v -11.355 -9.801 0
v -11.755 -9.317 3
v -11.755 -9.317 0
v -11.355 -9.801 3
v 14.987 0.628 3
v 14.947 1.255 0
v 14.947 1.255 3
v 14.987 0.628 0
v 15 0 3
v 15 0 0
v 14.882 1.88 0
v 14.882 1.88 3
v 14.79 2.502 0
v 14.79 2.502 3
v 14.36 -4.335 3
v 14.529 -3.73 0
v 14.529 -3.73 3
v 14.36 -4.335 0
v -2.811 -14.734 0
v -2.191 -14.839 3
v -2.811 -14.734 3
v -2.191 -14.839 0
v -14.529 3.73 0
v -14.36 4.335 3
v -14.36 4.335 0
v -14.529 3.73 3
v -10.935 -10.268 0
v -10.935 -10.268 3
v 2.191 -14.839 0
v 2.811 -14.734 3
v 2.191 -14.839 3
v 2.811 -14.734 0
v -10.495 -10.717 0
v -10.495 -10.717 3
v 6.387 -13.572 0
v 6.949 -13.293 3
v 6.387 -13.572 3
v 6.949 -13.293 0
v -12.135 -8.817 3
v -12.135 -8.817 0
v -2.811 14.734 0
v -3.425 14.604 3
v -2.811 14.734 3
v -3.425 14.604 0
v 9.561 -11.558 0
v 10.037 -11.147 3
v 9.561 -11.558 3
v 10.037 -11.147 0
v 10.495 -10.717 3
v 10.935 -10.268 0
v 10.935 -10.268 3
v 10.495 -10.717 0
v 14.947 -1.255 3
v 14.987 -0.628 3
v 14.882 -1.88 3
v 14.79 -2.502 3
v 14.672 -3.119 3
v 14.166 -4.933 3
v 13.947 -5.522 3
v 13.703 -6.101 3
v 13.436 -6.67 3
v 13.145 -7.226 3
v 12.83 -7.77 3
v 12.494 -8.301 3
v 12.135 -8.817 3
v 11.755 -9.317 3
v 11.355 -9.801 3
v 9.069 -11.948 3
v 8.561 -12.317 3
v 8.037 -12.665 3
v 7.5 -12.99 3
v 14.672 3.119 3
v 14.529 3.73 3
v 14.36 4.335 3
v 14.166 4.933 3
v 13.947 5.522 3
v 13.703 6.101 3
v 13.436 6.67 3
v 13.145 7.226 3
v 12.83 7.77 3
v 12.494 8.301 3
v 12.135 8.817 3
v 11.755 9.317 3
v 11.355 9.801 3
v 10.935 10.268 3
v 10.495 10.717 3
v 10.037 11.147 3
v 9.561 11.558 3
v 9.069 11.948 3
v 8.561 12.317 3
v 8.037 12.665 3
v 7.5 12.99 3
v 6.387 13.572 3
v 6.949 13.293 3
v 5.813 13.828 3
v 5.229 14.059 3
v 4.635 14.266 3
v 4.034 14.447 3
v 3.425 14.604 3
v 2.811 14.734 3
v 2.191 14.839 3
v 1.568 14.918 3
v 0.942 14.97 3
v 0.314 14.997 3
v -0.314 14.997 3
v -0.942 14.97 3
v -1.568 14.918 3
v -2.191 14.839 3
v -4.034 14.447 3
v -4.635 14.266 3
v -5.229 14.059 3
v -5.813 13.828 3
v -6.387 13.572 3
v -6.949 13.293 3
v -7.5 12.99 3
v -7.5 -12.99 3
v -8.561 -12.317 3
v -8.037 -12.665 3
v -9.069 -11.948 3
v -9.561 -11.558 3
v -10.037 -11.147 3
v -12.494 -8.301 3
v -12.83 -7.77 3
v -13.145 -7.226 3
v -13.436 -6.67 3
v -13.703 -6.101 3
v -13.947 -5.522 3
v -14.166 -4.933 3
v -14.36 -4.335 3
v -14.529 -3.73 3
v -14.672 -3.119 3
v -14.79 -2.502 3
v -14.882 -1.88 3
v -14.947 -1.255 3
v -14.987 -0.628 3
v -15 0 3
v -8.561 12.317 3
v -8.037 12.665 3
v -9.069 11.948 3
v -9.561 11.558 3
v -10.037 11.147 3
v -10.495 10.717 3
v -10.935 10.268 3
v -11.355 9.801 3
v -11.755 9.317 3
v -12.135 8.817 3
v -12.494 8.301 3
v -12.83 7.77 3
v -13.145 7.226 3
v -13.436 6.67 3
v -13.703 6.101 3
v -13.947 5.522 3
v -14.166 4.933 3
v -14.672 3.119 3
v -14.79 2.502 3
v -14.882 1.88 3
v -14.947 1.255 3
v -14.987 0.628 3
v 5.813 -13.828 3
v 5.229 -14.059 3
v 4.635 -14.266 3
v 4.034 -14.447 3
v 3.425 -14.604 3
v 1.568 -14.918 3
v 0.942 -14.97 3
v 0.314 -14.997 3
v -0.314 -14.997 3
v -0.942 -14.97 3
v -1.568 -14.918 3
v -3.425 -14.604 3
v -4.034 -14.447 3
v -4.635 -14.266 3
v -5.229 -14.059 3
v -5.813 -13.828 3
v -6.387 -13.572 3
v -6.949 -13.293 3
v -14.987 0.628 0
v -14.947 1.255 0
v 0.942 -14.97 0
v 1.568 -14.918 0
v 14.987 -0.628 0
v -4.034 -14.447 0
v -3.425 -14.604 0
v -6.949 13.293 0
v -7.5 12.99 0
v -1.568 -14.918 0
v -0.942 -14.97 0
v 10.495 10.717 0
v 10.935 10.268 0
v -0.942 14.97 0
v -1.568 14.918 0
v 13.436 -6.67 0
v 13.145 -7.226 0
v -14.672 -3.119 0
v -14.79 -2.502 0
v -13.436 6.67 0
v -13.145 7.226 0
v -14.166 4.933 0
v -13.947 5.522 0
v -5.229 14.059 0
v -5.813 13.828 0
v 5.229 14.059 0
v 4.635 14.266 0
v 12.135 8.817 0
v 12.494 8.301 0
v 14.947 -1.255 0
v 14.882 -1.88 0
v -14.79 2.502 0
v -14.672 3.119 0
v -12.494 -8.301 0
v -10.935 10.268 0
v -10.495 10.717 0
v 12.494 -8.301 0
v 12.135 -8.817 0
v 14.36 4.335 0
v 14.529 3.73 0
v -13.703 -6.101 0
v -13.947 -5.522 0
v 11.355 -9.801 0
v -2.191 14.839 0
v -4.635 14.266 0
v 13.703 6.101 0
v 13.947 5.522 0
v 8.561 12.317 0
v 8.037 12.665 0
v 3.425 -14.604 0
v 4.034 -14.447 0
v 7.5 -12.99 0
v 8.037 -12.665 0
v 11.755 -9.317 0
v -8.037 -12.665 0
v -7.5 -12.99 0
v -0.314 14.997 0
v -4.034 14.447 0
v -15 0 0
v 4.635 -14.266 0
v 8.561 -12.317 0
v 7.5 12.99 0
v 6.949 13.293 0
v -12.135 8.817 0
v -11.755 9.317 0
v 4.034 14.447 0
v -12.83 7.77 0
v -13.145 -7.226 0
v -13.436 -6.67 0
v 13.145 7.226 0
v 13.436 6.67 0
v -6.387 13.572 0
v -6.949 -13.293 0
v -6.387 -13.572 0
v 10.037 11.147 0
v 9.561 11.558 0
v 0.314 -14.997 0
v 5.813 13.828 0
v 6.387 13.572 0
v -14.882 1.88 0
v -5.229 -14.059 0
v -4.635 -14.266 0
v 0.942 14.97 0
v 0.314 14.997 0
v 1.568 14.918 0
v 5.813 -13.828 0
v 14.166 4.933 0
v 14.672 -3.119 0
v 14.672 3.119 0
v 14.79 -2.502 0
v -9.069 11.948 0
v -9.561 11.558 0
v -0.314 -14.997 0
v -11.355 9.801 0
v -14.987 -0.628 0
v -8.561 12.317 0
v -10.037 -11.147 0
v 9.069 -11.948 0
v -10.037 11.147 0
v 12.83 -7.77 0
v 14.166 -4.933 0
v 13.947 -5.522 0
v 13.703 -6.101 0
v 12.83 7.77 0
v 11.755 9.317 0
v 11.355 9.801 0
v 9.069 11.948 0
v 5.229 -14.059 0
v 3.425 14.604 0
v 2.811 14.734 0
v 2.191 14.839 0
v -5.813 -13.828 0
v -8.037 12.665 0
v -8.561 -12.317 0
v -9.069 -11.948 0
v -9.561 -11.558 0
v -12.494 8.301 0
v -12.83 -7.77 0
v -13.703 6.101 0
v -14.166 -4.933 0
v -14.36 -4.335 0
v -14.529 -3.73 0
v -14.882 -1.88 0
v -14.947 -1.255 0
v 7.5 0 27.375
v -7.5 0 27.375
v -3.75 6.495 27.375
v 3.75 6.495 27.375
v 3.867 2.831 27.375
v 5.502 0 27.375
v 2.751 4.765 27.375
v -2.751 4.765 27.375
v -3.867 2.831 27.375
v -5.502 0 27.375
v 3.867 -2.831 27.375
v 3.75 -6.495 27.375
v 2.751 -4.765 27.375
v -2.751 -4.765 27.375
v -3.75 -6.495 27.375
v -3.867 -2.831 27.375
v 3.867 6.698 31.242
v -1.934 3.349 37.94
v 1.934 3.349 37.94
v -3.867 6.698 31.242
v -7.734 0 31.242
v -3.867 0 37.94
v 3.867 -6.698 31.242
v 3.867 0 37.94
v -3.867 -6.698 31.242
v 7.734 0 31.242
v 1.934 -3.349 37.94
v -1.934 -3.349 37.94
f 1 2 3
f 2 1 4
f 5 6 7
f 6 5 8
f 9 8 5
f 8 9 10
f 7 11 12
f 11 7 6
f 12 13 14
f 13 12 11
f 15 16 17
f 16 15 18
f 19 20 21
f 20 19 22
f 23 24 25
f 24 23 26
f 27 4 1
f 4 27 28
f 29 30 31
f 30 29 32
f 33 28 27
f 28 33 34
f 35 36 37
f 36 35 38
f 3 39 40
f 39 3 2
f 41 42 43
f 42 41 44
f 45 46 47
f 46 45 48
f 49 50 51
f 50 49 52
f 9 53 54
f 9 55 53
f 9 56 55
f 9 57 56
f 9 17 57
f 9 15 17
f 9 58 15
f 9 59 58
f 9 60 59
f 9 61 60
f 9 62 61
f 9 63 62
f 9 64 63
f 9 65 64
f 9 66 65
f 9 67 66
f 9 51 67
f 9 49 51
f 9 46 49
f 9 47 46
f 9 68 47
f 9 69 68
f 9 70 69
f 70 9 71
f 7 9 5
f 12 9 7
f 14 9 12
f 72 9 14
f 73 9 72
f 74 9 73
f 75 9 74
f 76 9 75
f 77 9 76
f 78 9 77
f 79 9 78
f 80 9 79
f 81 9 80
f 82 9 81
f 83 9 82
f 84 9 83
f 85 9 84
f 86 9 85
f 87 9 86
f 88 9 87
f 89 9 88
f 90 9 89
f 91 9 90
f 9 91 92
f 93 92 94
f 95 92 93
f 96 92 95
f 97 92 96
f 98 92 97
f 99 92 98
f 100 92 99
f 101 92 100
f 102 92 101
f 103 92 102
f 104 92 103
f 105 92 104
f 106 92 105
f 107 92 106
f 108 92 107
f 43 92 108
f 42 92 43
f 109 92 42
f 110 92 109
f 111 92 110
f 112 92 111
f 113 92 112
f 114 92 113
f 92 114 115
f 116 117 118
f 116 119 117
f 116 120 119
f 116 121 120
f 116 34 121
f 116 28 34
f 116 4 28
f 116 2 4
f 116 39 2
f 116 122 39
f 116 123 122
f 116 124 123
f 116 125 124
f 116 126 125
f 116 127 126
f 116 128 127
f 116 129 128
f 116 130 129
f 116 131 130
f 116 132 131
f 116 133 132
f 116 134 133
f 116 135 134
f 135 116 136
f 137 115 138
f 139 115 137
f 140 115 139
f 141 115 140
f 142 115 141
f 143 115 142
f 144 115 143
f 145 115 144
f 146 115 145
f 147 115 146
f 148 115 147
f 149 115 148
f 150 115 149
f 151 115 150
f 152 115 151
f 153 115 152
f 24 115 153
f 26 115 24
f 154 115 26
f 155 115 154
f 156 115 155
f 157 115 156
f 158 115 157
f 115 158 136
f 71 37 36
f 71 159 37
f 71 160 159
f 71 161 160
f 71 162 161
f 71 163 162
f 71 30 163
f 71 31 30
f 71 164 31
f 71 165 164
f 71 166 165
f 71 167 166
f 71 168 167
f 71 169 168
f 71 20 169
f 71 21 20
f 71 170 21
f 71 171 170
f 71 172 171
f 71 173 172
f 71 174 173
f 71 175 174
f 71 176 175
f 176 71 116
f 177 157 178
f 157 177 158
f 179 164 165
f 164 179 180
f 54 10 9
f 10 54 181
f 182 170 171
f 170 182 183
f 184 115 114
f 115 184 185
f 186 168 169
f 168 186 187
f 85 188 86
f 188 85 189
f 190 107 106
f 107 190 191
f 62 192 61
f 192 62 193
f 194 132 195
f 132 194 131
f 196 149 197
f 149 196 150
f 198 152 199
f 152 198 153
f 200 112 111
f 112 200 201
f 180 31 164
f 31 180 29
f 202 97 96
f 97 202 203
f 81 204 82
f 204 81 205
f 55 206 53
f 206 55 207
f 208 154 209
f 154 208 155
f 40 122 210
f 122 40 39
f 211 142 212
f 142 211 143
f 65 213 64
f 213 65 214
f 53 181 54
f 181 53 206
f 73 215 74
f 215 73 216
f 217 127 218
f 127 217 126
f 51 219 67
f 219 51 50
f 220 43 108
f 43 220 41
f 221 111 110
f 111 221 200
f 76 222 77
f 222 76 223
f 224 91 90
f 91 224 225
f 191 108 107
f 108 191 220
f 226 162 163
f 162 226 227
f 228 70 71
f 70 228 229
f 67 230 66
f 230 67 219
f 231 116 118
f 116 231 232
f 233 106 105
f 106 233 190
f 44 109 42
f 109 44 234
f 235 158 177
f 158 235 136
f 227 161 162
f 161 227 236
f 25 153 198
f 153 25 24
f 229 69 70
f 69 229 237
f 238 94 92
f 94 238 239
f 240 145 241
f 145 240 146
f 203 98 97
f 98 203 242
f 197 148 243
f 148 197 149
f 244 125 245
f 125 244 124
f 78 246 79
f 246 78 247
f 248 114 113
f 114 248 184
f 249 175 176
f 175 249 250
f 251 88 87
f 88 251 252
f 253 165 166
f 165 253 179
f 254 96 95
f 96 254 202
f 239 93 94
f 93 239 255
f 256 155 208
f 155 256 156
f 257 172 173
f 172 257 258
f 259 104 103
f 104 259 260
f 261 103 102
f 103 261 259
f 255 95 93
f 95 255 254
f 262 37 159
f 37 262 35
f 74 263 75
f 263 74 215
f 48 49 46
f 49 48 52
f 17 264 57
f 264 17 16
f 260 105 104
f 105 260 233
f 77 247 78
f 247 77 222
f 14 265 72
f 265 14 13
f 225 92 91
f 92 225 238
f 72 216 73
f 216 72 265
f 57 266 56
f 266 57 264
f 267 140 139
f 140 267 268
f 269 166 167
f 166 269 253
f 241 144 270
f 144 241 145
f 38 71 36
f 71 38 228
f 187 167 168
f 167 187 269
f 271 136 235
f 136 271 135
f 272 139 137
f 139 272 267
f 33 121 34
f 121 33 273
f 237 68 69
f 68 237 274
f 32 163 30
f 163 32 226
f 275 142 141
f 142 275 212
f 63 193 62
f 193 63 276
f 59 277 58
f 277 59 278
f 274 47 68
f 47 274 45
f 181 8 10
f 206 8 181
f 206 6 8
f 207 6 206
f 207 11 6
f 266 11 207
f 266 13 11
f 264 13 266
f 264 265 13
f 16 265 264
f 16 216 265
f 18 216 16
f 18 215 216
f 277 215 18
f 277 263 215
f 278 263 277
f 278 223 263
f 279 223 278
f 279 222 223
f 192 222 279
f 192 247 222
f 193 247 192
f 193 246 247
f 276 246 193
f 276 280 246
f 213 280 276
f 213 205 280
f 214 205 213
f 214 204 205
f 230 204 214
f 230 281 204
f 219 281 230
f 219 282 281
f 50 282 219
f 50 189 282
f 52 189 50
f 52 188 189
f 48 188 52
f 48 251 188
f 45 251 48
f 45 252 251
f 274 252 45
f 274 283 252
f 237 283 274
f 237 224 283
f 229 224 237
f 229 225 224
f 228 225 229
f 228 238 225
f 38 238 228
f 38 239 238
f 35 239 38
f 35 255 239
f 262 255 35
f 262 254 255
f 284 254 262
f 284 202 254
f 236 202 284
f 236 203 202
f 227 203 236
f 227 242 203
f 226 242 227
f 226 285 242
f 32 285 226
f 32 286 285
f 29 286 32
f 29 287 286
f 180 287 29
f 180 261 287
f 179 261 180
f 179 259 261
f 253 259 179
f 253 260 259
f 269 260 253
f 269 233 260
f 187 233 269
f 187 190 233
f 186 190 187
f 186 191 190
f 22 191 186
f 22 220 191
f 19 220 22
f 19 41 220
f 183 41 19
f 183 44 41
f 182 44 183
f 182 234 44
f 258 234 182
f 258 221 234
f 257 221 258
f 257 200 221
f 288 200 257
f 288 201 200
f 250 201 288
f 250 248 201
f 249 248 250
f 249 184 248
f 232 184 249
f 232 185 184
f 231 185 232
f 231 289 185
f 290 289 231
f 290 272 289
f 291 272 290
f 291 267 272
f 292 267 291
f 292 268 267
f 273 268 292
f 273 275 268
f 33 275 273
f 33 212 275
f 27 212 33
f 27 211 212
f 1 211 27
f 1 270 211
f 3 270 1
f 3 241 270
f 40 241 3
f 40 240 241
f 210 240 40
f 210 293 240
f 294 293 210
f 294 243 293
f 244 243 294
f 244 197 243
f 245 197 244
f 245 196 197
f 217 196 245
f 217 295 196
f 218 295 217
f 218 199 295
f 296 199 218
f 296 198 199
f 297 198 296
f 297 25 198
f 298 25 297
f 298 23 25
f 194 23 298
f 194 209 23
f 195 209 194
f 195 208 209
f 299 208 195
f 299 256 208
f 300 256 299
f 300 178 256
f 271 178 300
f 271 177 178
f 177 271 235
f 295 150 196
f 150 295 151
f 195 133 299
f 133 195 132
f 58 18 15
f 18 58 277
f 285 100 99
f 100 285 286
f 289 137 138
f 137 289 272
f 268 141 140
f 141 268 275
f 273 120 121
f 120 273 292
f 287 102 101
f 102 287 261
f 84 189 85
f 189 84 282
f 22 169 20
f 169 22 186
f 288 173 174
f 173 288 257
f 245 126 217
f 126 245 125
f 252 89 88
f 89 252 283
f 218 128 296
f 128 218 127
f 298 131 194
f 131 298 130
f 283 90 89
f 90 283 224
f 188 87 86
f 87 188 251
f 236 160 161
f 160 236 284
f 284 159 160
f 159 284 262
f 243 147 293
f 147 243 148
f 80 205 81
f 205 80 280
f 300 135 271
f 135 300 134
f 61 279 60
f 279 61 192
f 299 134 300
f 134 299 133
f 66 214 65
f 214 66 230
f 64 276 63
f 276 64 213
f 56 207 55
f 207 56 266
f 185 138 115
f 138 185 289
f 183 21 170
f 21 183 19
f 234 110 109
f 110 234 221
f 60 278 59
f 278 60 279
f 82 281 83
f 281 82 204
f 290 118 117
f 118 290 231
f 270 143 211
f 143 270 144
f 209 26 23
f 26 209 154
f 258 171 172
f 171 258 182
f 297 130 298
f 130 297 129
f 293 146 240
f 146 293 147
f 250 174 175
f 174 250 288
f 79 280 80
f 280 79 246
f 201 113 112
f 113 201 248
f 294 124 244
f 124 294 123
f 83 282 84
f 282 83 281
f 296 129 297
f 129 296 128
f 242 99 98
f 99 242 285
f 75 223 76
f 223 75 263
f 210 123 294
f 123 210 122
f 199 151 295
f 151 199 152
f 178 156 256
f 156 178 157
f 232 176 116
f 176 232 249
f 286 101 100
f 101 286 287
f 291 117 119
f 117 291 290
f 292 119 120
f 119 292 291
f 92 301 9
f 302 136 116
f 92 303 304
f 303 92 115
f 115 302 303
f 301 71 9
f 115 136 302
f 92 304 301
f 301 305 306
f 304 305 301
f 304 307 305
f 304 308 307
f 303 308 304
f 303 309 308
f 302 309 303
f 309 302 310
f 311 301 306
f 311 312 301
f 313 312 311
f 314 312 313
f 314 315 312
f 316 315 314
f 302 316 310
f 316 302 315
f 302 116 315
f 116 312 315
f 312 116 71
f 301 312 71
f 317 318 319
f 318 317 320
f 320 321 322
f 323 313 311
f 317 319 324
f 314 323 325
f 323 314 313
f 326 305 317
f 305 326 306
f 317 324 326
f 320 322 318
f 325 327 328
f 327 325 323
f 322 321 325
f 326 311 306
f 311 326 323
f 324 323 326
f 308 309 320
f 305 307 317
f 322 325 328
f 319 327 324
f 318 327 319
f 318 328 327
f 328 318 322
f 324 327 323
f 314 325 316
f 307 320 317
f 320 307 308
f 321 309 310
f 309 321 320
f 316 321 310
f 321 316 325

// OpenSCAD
$fn = 150;

union() {
	cylinder(d = 30.0, h = 3.0);
	translate(v = [0, 0, 3.0]) {
		cylinder($fn = 6, d1 = 30.0, d2 = 15.0, h = 24.375);
	}
	translate(v = [0, 0, 31.2421875]) {
		sphere($fn = 6, d = 15.468750000000002);
	}
}
